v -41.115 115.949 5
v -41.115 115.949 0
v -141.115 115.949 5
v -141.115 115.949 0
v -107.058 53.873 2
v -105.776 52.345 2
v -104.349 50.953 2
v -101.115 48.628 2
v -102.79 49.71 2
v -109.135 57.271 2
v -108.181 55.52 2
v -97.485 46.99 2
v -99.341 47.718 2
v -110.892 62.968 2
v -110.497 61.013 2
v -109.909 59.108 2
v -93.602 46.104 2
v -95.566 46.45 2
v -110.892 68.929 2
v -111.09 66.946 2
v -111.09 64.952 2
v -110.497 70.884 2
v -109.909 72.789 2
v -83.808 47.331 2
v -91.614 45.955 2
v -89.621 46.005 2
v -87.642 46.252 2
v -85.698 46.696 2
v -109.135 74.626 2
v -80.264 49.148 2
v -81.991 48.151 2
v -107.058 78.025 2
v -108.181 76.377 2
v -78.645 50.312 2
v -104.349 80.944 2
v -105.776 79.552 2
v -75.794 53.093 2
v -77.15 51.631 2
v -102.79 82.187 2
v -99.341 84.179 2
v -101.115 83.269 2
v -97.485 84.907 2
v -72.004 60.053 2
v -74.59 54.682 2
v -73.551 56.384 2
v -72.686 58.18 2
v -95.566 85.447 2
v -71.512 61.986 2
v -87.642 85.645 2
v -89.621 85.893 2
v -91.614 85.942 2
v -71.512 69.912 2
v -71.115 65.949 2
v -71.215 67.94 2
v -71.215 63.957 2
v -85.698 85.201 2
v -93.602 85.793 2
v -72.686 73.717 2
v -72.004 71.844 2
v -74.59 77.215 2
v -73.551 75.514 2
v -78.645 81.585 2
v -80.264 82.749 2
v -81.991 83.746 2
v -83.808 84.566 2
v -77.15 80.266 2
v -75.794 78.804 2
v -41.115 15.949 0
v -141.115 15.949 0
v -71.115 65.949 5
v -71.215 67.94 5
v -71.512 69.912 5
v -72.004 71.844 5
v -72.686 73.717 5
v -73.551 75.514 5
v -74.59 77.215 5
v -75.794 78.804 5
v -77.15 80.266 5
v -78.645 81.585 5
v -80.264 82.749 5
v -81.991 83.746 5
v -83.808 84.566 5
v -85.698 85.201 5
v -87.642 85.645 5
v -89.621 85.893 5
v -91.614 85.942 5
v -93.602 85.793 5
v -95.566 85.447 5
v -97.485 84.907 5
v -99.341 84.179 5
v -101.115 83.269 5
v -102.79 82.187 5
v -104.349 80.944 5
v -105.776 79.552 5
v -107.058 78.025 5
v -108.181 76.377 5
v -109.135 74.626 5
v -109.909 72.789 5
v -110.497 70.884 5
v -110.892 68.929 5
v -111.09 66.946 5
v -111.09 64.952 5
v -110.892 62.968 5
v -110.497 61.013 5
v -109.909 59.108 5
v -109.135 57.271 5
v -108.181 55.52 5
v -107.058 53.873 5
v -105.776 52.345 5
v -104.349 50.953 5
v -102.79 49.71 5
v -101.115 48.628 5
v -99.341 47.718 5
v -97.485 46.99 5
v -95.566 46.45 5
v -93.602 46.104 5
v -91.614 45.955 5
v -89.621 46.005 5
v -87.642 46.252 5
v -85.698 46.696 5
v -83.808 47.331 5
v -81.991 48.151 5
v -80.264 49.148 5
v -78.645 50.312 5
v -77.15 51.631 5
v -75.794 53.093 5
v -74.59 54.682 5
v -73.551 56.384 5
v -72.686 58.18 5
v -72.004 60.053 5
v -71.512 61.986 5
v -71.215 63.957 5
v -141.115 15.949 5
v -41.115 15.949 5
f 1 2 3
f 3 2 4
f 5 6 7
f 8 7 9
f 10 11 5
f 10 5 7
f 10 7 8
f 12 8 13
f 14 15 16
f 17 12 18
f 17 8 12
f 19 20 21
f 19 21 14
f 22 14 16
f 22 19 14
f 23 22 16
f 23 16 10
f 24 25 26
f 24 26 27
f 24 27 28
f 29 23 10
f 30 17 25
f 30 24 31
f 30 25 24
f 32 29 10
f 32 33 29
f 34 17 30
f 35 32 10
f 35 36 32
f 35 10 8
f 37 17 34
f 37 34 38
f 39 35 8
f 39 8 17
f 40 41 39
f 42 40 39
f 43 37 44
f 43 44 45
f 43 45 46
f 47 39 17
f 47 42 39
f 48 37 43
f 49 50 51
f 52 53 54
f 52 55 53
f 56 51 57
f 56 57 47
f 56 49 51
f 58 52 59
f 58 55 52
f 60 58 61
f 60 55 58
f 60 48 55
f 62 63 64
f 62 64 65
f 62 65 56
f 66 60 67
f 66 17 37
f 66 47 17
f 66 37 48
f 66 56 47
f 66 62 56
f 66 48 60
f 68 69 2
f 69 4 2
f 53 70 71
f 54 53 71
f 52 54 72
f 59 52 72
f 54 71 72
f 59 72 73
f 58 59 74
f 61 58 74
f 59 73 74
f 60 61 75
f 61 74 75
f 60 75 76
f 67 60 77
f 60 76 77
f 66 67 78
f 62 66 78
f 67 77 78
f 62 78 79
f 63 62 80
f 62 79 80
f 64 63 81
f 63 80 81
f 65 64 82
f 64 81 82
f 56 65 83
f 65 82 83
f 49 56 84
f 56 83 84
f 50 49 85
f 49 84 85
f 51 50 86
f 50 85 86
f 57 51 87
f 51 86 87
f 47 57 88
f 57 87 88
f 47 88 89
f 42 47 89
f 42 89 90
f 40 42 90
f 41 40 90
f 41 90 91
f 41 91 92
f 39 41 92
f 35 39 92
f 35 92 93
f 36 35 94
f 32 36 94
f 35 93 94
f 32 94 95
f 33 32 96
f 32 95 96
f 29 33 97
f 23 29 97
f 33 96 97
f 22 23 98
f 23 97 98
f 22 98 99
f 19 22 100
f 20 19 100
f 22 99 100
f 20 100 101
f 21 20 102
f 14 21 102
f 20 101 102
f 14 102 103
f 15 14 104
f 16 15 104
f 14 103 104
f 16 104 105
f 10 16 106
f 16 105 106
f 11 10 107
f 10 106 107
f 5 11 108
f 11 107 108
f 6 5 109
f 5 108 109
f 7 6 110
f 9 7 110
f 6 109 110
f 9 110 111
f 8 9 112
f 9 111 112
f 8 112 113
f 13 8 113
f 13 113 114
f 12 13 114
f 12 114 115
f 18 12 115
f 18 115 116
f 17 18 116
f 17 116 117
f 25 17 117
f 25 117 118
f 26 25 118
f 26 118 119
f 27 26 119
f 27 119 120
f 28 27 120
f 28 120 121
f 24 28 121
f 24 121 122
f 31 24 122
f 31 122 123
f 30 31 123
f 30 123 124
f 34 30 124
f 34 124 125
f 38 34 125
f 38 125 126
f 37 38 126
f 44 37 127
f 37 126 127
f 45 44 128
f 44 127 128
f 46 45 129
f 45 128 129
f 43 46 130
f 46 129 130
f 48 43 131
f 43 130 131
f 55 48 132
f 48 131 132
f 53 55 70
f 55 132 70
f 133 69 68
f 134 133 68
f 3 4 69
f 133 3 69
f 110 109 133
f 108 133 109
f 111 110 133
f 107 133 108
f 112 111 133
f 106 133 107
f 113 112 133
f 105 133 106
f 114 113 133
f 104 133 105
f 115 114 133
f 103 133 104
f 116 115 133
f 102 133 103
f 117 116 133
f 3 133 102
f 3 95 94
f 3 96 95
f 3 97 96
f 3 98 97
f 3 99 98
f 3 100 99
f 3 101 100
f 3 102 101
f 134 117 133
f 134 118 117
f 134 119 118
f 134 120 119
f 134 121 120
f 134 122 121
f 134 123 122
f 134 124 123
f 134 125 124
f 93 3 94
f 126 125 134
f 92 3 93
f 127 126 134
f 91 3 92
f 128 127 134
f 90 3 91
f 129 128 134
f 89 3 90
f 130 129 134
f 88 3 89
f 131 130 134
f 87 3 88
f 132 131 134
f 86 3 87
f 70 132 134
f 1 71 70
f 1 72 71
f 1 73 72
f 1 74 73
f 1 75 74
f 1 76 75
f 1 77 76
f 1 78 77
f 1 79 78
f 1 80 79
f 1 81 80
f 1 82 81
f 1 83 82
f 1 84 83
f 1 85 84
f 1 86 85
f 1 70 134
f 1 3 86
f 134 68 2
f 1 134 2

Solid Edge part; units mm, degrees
sketch "Sketch1" plane through (0, 0, 0) normal (0, 0, 1) x (1, 0, 0)
  line L0 (-141.1152, 15.9486) -> (-41.1152, 15.9486)
  line L1 (-41.1152, 15.9486) -> (-41.1152, 115.9486)
  line L2 (-41.1152, 115.9486) -> (-141.1152, 115.9486)
  line L3 (-141.1152, 115.9486) -> (-141.1152, 15.9486)
  dimension "D1" = 100
  dimension "D2" = 100
extrude "Protrusion1" add sketch "Sketch1" along normal blind 5
sketch "Sketch2" plane through (-66.1152, 40.9486, 5) normal (0, 0, 1) x (1, 0, 0)
  circle A0 centre (-25, 25) radius 20
  dimension "D1" = 50
  dimension "D2" = 50
extrude "ExtrudedCutout_1" cut sketch "Sketch2" against normal blind 3
